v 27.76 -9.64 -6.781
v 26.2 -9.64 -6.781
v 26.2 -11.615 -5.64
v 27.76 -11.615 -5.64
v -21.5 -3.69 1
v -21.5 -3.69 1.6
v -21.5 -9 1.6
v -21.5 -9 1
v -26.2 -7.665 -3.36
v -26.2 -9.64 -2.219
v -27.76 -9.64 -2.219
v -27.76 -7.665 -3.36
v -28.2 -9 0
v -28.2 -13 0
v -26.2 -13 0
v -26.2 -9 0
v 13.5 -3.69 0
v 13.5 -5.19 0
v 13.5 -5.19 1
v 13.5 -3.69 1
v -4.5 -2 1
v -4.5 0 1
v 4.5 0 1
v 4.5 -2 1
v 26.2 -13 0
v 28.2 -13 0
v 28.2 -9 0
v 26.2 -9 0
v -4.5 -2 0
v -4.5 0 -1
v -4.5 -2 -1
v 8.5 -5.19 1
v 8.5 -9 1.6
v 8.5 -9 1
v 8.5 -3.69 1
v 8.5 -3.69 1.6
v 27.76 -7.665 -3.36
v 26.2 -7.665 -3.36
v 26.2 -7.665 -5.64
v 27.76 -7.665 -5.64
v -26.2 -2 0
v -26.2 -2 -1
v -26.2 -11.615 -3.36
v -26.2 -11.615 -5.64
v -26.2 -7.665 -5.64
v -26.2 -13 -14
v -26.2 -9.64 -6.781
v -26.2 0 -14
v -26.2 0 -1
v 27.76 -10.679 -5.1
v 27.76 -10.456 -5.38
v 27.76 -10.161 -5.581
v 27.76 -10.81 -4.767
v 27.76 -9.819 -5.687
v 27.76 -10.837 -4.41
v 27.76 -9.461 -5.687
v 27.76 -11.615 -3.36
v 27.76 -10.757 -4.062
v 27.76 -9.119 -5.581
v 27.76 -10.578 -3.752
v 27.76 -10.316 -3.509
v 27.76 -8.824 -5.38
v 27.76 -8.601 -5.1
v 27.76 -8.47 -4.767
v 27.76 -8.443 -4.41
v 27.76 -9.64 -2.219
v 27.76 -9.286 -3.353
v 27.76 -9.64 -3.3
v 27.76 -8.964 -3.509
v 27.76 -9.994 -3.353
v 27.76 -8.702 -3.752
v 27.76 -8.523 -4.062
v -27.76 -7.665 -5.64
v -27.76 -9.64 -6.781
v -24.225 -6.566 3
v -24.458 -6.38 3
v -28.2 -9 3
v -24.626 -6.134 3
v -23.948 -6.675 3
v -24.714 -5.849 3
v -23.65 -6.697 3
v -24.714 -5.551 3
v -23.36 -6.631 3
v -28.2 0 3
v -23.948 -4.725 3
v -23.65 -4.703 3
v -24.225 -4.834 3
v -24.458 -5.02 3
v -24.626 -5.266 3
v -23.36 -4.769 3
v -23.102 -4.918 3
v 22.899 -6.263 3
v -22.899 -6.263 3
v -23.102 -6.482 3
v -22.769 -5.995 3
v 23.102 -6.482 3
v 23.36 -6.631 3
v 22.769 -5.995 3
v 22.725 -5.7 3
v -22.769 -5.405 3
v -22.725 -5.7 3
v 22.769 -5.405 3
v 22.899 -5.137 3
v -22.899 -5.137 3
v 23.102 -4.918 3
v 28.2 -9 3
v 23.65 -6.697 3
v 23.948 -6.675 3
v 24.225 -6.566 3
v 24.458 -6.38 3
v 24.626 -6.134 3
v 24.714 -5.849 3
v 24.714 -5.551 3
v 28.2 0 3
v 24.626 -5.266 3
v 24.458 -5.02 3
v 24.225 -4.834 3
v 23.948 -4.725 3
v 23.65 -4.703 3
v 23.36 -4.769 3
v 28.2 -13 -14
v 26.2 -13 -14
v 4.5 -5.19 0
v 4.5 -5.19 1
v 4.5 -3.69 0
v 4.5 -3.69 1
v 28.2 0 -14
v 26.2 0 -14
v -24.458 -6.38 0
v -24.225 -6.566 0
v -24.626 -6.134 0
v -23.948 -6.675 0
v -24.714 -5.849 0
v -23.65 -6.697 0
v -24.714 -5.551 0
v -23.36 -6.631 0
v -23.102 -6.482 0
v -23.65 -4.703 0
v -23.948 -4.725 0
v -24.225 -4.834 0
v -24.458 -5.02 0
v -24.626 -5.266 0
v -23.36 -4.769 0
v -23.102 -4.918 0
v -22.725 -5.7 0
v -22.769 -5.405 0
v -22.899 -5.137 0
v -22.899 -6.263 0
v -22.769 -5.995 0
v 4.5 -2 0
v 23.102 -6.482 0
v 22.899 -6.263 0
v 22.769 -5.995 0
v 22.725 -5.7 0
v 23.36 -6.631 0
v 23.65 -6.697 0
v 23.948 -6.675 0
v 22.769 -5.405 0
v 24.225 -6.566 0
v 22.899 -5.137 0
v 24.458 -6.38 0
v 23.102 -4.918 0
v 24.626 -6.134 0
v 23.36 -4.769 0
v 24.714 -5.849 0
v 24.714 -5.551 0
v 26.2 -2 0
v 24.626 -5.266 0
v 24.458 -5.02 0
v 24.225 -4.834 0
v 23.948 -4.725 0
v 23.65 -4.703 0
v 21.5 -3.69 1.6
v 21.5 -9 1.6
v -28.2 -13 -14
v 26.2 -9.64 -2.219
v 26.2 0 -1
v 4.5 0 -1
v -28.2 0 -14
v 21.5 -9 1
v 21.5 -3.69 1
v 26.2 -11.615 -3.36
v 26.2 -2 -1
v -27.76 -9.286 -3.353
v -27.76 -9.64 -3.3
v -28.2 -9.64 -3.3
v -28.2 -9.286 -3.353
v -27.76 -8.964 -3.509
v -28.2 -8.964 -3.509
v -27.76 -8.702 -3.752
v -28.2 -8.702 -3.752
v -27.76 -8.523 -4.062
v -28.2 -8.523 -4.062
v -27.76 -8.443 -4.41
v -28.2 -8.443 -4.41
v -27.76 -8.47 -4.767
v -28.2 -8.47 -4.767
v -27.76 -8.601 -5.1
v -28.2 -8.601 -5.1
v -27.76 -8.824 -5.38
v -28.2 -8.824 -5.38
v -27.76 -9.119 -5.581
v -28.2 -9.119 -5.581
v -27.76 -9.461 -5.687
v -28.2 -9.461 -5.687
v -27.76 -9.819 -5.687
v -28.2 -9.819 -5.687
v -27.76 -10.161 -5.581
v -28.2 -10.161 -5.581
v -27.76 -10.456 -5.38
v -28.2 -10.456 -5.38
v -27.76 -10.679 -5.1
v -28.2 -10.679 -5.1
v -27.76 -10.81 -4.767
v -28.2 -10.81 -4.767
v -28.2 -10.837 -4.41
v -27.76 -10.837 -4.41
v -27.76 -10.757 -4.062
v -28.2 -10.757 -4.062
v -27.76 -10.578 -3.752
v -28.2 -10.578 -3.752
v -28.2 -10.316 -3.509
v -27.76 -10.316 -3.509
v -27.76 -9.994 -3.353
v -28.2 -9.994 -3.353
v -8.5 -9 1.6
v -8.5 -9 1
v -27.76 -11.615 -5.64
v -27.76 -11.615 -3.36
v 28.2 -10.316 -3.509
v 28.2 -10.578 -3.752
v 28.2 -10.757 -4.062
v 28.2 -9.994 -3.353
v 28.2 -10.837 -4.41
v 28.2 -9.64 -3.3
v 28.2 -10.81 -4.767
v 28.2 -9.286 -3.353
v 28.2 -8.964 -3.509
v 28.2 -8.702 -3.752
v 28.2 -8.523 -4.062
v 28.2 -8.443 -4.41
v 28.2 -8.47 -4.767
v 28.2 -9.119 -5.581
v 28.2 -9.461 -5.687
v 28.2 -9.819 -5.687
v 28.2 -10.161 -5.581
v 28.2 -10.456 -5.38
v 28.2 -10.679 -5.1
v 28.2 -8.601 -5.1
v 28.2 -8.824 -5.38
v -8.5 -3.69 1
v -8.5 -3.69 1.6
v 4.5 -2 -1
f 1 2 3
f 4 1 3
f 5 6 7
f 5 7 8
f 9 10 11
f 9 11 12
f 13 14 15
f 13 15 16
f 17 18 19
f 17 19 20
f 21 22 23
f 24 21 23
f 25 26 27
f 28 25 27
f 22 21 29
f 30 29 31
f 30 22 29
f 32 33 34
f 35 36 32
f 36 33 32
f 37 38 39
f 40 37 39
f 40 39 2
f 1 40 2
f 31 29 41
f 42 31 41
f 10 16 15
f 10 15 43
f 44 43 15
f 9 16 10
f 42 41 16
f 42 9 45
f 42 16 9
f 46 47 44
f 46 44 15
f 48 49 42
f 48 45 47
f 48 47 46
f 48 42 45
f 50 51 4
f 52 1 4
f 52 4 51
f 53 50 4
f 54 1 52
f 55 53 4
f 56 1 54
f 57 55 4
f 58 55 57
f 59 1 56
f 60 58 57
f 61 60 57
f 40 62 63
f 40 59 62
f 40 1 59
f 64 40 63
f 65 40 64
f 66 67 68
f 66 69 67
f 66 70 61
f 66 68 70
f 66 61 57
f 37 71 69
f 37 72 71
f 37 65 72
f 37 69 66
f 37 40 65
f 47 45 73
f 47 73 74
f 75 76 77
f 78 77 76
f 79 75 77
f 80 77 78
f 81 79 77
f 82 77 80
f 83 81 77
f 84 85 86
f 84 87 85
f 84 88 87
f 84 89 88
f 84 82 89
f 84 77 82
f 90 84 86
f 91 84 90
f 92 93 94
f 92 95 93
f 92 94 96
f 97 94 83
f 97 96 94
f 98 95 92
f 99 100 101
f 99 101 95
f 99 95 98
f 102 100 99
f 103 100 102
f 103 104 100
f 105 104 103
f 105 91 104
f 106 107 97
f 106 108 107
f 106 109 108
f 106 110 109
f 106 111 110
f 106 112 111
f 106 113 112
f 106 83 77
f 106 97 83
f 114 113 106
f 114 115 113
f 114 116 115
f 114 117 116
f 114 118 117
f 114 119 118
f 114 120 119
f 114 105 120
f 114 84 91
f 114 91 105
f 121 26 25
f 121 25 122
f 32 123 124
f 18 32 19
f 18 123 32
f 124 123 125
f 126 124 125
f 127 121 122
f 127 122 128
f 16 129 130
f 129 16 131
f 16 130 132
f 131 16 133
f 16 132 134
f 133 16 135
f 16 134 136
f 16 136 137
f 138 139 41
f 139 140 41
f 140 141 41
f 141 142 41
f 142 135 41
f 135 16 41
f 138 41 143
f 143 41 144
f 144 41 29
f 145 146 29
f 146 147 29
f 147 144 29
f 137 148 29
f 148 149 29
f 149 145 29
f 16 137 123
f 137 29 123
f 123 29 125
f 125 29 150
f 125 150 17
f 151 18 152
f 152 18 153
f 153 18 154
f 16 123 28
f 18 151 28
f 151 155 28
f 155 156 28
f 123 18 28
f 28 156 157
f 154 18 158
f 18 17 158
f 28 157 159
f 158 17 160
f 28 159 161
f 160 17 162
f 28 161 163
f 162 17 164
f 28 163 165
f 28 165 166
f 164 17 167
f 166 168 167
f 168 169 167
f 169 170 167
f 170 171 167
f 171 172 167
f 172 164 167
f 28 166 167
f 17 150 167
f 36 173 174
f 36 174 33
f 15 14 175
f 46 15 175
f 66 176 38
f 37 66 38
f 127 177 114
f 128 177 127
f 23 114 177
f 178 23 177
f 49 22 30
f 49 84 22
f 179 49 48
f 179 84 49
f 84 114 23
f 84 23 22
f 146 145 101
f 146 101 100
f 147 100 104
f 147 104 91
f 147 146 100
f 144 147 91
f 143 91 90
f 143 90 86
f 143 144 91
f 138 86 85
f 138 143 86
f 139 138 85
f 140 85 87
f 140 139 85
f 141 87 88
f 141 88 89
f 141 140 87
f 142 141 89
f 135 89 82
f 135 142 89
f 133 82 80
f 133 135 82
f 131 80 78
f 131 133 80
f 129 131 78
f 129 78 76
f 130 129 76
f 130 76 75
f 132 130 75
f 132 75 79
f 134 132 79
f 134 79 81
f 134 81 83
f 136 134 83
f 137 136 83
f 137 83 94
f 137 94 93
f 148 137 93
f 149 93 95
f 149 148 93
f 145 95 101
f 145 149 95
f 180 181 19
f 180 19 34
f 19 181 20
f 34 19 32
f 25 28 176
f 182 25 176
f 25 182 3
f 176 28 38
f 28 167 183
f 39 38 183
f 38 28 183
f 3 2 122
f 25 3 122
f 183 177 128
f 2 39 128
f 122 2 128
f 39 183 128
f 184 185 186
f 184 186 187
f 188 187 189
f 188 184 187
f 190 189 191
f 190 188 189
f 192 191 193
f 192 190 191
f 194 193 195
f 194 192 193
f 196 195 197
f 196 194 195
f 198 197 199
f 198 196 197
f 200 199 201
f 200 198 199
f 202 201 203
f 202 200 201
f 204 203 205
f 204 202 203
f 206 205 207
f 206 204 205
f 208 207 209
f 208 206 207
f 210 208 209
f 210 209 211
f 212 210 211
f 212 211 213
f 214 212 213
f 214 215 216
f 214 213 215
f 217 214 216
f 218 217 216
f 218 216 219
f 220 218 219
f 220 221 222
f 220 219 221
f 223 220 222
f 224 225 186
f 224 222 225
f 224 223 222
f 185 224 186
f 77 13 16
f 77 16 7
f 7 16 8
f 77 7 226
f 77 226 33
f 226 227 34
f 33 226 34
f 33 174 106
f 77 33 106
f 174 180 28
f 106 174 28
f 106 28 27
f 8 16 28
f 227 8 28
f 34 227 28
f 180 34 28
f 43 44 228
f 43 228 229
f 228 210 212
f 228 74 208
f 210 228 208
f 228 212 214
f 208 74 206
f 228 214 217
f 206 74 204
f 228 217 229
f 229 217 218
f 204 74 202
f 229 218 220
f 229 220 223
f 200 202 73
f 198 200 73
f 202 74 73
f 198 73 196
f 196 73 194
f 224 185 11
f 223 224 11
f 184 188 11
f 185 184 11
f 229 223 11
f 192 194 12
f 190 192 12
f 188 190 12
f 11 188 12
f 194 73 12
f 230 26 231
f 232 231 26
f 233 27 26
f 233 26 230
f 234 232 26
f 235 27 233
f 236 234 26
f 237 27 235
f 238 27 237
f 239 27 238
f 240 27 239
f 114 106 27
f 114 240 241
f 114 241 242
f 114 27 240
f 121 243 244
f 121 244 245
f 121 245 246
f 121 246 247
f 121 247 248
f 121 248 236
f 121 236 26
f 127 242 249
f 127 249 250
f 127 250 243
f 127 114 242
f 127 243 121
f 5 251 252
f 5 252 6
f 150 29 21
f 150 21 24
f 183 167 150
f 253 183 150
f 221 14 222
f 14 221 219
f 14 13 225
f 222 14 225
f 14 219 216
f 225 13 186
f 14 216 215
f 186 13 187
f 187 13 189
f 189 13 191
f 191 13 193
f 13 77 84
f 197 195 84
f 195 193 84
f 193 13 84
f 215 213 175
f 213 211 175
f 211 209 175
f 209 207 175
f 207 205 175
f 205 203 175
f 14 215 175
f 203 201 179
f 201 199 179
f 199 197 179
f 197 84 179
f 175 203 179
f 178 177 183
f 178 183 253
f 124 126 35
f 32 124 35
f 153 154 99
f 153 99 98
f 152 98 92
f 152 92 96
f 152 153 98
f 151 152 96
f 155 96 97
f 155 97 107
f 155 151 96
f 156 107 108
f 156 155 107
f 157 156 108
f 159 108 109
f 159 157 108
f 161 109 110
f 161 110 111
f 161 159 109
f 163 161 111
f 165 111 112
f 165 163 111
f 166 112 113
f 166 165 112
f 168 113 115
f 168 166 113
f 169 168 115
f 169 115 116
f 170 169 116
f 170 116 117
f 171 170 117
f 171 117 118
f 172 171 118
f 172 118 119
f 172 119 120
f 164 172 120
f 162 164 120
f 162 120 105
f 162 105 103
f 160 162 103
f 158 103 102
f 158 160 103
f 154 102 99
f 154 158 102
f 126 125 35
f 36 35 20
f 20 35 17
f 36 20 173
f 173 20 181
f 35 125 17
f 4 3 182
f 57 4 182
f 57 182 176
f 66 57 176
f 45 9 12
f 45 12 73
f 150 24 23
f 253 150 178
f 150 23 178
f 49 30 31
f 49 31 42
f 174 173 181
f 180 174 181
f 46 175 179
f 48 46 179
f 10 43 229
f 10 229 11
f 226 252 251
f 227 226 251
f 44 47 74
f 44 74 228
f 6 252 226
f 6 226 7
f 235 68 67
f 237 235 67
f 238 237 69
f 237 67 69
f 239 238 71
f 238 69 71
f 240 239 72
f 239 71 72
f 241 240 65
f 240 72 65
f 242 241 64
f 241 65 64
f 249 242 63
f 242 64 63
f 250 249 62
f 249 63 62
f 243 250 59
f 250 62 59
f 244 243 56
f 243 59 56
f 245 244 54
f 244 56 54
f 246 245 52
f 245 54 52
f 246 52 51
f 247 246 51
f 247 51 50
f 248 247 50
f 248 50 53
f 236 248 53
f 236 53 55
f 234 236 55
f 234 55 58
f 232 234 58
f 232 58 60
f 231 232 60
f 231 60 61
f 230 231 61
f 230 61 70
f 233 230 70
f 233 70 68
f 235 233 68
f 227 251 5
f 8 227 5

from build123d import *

# Parameters (mm, degrees)
SCHIZZO1_W                   = 56.4
SCHIZZO1_H                   = 9
SCHIZZO1_R                   = 1
ESTRUSIONE_ESTRUSIONE1_DEPTH = 3
SCHIZZO3_W                   = 14
SCHIZZO3_H                   = 13
ESTRUSIONE_ESTRUSIONE3_DEPTH = 2
FORO_PER_VITE_M2_1_D         = 2.4
FORO_PER_VITE_M2_1_DEPTH     = 56.4
TAGLIO_ESTRUSIONE1_DEPTH     = 1.56
SCHIZZO8_W                   = 9
SCHIZZO8_H                   = 1.5
TAGLIO_ESTRUSIONE2_DEPTH     = 1
SCHIZZO2_W                   = 52.4
SCHIZZO2_H                   = 2
ESTRUSIONE_ESTRUSIONE6_DEPTH = 1
SCHIZZO9_W                   = 9
SCHIZZO9_H                   = 2
TAGLIO_ESTRUSIONE3_DEPTH     = 2
TAGLIO_ESTRUSIONE5_START     = -29.09
SCHIZZO11_W                  = 13
SCHIZZO11_H                  = 0.6
TAGLIO_ESTRUSIONE5_DEPTH     = 74.965030919


with BuildPart() as part:
    # Schizzo1 → Estrusione-Estrusione1 (new body)
    with BuildSketch(Plane.XY):
        with Locations((0, -4.5)):
            Rectangle(SCHIZZO1_W, SCHIZZO1_H)
        with Locations((-23.725, -5.7)):
            Circle(SCHIZZO1_R, mode=Mode.SUBTRACT)
        with Locations(Location((23.725, -5.7, 0), (0, 0, 180))):
            Circle(SCHIZZO1_R, mode=Mode.SUBTRACT)
    extrude(amount=ESTRUSIONE_ESTRUSIONE1_DEPTH)

    # Schizzo3 → Estrusione-Estrusione3 (add)
    with BuildSketch(Plane(origin=(28.2, 0, 0), x_dir=(0, 0, -1), z_dir=(1, 0, 0))):
        with Locations((7, -6.5)):
            Rectangle(SCHIZZO3_W, SCHIZZO3_H)
    estrusione_estrusione3 = extrude(amount=-ESTRUSIONE_ESTRUSIONE3_DEPTH)

    # Foro per Vite M2-1
    with Locations(Plane(origin=(28.2, 0, 0), x_dir=(0, 0, -1), z_dir=(1, 0, 0))):
        with Locations((4.5, -9.64)):
            foro_per_vite_m2_1 = Hole(FORO_PER_VITE_M2_1_D / 2, depth=FORO_PER_VITE_M2_1_DEPTH)

    # Schizzo6 → Taglio-Estrusione1 (cut)
    with BuildSketch(Plane.ZY.offset(-26.2)):
        Polygon((-3.359733218, -7.665), (-5.640266782, -7.665), (-6.780533563, -9.64), (-5.640266782, -11.615), (-3.359733218, -11.615), (-2.219466437, -9.64), align=None)
    taglio_estrusione1 = extrude(amount=-TAGLIO_ESTRUSIONE1_DEPTH, mode=Mode.SUBTRACT)

    # Specchia2: Estrusione-Estrusione3, Foro per Vite M2-1, Taglio-Estrusione1 across plane
    add(estrusione_estrusione3.mirror(Plane(origin=(0, 0, 0), x_dir=(0, 0, 1), z_dir=(1, 0, 0))))
    add(foro_per_vite_m2_1.mirror(Plane(origin=(0, 0, 0), x_dir=(0, 0, 1), z_dir=(1, 0, 0))), mode=Mode.SUBTRACT)
    add(taglio_estrusione1.mirror(Plane(origin=(0, 0, 0), x_dir=(0, 0, 1), z_dir=(1, 0, 0))), mode=Mode.SUBTRACT)

    # Schizzo8 → Taglio-Estrusione2 (cut)
    with BuildSketch(Plane.XY):
        with Locations((9, -4.44)):
            Rectangle(SCHIZZO8_W, SCHIZZO8_H)
    extrude(amount=TAGLIO_ESTRUSIONE2_DEPTH, mode=Mode.SUBTRACT)

    # Schizzo2 → Estrusione-Estrusione6 (add)
    with BuildSketch(Plane(origin=(0, 0, 0), x_dir=(-1, 0, 0), z_dir=(0, 0, -1))):
        with Locations((0, -1)):
            Rectangle(SCHIZZO2_W, SCHIZZO2_H)
    extrude(amount=ESTRUSIONE_ESTRUSIONE6_DEPTH)

    # Schizzo9 → Taglio-Estrusione3 (cut)
    with BuildSketch(Plane(origin=(0, 0, 0), x_dir=(1, 0, 0), z_dir=(0, 1, 0))):
        Rectangle(SCHIZZO9_W, SCHIZZO9_H)
    extrude(amount=-TAGLIO_ESTRUSIONE3_DEPTH, mode=Mode.SUBTRACT)

    # Schizzo11 → Taglio-Estrusione5 (cut, through all)
    with BuildSketch(Plane(origin=(0, -32.78, -9), x_dir=(-1, 0, 0), z_dir=(0, -1, 0)).offset(TAGLIO_ESTRUSIONE5_START)):
        with Locations((15, -10.3)):
            Rectangle(SCHIZZO11_W, SCHIZZO11_H)
        with Locations((-15, -10.3)):
            Rectangle(SCHIZZO11_W, SCHIZZO11_H)
    extrude(amount=TAGLIO_ESTRUSIONE5_DEPTH, mode=Mode.SUBTRACT)


solid = part.part
